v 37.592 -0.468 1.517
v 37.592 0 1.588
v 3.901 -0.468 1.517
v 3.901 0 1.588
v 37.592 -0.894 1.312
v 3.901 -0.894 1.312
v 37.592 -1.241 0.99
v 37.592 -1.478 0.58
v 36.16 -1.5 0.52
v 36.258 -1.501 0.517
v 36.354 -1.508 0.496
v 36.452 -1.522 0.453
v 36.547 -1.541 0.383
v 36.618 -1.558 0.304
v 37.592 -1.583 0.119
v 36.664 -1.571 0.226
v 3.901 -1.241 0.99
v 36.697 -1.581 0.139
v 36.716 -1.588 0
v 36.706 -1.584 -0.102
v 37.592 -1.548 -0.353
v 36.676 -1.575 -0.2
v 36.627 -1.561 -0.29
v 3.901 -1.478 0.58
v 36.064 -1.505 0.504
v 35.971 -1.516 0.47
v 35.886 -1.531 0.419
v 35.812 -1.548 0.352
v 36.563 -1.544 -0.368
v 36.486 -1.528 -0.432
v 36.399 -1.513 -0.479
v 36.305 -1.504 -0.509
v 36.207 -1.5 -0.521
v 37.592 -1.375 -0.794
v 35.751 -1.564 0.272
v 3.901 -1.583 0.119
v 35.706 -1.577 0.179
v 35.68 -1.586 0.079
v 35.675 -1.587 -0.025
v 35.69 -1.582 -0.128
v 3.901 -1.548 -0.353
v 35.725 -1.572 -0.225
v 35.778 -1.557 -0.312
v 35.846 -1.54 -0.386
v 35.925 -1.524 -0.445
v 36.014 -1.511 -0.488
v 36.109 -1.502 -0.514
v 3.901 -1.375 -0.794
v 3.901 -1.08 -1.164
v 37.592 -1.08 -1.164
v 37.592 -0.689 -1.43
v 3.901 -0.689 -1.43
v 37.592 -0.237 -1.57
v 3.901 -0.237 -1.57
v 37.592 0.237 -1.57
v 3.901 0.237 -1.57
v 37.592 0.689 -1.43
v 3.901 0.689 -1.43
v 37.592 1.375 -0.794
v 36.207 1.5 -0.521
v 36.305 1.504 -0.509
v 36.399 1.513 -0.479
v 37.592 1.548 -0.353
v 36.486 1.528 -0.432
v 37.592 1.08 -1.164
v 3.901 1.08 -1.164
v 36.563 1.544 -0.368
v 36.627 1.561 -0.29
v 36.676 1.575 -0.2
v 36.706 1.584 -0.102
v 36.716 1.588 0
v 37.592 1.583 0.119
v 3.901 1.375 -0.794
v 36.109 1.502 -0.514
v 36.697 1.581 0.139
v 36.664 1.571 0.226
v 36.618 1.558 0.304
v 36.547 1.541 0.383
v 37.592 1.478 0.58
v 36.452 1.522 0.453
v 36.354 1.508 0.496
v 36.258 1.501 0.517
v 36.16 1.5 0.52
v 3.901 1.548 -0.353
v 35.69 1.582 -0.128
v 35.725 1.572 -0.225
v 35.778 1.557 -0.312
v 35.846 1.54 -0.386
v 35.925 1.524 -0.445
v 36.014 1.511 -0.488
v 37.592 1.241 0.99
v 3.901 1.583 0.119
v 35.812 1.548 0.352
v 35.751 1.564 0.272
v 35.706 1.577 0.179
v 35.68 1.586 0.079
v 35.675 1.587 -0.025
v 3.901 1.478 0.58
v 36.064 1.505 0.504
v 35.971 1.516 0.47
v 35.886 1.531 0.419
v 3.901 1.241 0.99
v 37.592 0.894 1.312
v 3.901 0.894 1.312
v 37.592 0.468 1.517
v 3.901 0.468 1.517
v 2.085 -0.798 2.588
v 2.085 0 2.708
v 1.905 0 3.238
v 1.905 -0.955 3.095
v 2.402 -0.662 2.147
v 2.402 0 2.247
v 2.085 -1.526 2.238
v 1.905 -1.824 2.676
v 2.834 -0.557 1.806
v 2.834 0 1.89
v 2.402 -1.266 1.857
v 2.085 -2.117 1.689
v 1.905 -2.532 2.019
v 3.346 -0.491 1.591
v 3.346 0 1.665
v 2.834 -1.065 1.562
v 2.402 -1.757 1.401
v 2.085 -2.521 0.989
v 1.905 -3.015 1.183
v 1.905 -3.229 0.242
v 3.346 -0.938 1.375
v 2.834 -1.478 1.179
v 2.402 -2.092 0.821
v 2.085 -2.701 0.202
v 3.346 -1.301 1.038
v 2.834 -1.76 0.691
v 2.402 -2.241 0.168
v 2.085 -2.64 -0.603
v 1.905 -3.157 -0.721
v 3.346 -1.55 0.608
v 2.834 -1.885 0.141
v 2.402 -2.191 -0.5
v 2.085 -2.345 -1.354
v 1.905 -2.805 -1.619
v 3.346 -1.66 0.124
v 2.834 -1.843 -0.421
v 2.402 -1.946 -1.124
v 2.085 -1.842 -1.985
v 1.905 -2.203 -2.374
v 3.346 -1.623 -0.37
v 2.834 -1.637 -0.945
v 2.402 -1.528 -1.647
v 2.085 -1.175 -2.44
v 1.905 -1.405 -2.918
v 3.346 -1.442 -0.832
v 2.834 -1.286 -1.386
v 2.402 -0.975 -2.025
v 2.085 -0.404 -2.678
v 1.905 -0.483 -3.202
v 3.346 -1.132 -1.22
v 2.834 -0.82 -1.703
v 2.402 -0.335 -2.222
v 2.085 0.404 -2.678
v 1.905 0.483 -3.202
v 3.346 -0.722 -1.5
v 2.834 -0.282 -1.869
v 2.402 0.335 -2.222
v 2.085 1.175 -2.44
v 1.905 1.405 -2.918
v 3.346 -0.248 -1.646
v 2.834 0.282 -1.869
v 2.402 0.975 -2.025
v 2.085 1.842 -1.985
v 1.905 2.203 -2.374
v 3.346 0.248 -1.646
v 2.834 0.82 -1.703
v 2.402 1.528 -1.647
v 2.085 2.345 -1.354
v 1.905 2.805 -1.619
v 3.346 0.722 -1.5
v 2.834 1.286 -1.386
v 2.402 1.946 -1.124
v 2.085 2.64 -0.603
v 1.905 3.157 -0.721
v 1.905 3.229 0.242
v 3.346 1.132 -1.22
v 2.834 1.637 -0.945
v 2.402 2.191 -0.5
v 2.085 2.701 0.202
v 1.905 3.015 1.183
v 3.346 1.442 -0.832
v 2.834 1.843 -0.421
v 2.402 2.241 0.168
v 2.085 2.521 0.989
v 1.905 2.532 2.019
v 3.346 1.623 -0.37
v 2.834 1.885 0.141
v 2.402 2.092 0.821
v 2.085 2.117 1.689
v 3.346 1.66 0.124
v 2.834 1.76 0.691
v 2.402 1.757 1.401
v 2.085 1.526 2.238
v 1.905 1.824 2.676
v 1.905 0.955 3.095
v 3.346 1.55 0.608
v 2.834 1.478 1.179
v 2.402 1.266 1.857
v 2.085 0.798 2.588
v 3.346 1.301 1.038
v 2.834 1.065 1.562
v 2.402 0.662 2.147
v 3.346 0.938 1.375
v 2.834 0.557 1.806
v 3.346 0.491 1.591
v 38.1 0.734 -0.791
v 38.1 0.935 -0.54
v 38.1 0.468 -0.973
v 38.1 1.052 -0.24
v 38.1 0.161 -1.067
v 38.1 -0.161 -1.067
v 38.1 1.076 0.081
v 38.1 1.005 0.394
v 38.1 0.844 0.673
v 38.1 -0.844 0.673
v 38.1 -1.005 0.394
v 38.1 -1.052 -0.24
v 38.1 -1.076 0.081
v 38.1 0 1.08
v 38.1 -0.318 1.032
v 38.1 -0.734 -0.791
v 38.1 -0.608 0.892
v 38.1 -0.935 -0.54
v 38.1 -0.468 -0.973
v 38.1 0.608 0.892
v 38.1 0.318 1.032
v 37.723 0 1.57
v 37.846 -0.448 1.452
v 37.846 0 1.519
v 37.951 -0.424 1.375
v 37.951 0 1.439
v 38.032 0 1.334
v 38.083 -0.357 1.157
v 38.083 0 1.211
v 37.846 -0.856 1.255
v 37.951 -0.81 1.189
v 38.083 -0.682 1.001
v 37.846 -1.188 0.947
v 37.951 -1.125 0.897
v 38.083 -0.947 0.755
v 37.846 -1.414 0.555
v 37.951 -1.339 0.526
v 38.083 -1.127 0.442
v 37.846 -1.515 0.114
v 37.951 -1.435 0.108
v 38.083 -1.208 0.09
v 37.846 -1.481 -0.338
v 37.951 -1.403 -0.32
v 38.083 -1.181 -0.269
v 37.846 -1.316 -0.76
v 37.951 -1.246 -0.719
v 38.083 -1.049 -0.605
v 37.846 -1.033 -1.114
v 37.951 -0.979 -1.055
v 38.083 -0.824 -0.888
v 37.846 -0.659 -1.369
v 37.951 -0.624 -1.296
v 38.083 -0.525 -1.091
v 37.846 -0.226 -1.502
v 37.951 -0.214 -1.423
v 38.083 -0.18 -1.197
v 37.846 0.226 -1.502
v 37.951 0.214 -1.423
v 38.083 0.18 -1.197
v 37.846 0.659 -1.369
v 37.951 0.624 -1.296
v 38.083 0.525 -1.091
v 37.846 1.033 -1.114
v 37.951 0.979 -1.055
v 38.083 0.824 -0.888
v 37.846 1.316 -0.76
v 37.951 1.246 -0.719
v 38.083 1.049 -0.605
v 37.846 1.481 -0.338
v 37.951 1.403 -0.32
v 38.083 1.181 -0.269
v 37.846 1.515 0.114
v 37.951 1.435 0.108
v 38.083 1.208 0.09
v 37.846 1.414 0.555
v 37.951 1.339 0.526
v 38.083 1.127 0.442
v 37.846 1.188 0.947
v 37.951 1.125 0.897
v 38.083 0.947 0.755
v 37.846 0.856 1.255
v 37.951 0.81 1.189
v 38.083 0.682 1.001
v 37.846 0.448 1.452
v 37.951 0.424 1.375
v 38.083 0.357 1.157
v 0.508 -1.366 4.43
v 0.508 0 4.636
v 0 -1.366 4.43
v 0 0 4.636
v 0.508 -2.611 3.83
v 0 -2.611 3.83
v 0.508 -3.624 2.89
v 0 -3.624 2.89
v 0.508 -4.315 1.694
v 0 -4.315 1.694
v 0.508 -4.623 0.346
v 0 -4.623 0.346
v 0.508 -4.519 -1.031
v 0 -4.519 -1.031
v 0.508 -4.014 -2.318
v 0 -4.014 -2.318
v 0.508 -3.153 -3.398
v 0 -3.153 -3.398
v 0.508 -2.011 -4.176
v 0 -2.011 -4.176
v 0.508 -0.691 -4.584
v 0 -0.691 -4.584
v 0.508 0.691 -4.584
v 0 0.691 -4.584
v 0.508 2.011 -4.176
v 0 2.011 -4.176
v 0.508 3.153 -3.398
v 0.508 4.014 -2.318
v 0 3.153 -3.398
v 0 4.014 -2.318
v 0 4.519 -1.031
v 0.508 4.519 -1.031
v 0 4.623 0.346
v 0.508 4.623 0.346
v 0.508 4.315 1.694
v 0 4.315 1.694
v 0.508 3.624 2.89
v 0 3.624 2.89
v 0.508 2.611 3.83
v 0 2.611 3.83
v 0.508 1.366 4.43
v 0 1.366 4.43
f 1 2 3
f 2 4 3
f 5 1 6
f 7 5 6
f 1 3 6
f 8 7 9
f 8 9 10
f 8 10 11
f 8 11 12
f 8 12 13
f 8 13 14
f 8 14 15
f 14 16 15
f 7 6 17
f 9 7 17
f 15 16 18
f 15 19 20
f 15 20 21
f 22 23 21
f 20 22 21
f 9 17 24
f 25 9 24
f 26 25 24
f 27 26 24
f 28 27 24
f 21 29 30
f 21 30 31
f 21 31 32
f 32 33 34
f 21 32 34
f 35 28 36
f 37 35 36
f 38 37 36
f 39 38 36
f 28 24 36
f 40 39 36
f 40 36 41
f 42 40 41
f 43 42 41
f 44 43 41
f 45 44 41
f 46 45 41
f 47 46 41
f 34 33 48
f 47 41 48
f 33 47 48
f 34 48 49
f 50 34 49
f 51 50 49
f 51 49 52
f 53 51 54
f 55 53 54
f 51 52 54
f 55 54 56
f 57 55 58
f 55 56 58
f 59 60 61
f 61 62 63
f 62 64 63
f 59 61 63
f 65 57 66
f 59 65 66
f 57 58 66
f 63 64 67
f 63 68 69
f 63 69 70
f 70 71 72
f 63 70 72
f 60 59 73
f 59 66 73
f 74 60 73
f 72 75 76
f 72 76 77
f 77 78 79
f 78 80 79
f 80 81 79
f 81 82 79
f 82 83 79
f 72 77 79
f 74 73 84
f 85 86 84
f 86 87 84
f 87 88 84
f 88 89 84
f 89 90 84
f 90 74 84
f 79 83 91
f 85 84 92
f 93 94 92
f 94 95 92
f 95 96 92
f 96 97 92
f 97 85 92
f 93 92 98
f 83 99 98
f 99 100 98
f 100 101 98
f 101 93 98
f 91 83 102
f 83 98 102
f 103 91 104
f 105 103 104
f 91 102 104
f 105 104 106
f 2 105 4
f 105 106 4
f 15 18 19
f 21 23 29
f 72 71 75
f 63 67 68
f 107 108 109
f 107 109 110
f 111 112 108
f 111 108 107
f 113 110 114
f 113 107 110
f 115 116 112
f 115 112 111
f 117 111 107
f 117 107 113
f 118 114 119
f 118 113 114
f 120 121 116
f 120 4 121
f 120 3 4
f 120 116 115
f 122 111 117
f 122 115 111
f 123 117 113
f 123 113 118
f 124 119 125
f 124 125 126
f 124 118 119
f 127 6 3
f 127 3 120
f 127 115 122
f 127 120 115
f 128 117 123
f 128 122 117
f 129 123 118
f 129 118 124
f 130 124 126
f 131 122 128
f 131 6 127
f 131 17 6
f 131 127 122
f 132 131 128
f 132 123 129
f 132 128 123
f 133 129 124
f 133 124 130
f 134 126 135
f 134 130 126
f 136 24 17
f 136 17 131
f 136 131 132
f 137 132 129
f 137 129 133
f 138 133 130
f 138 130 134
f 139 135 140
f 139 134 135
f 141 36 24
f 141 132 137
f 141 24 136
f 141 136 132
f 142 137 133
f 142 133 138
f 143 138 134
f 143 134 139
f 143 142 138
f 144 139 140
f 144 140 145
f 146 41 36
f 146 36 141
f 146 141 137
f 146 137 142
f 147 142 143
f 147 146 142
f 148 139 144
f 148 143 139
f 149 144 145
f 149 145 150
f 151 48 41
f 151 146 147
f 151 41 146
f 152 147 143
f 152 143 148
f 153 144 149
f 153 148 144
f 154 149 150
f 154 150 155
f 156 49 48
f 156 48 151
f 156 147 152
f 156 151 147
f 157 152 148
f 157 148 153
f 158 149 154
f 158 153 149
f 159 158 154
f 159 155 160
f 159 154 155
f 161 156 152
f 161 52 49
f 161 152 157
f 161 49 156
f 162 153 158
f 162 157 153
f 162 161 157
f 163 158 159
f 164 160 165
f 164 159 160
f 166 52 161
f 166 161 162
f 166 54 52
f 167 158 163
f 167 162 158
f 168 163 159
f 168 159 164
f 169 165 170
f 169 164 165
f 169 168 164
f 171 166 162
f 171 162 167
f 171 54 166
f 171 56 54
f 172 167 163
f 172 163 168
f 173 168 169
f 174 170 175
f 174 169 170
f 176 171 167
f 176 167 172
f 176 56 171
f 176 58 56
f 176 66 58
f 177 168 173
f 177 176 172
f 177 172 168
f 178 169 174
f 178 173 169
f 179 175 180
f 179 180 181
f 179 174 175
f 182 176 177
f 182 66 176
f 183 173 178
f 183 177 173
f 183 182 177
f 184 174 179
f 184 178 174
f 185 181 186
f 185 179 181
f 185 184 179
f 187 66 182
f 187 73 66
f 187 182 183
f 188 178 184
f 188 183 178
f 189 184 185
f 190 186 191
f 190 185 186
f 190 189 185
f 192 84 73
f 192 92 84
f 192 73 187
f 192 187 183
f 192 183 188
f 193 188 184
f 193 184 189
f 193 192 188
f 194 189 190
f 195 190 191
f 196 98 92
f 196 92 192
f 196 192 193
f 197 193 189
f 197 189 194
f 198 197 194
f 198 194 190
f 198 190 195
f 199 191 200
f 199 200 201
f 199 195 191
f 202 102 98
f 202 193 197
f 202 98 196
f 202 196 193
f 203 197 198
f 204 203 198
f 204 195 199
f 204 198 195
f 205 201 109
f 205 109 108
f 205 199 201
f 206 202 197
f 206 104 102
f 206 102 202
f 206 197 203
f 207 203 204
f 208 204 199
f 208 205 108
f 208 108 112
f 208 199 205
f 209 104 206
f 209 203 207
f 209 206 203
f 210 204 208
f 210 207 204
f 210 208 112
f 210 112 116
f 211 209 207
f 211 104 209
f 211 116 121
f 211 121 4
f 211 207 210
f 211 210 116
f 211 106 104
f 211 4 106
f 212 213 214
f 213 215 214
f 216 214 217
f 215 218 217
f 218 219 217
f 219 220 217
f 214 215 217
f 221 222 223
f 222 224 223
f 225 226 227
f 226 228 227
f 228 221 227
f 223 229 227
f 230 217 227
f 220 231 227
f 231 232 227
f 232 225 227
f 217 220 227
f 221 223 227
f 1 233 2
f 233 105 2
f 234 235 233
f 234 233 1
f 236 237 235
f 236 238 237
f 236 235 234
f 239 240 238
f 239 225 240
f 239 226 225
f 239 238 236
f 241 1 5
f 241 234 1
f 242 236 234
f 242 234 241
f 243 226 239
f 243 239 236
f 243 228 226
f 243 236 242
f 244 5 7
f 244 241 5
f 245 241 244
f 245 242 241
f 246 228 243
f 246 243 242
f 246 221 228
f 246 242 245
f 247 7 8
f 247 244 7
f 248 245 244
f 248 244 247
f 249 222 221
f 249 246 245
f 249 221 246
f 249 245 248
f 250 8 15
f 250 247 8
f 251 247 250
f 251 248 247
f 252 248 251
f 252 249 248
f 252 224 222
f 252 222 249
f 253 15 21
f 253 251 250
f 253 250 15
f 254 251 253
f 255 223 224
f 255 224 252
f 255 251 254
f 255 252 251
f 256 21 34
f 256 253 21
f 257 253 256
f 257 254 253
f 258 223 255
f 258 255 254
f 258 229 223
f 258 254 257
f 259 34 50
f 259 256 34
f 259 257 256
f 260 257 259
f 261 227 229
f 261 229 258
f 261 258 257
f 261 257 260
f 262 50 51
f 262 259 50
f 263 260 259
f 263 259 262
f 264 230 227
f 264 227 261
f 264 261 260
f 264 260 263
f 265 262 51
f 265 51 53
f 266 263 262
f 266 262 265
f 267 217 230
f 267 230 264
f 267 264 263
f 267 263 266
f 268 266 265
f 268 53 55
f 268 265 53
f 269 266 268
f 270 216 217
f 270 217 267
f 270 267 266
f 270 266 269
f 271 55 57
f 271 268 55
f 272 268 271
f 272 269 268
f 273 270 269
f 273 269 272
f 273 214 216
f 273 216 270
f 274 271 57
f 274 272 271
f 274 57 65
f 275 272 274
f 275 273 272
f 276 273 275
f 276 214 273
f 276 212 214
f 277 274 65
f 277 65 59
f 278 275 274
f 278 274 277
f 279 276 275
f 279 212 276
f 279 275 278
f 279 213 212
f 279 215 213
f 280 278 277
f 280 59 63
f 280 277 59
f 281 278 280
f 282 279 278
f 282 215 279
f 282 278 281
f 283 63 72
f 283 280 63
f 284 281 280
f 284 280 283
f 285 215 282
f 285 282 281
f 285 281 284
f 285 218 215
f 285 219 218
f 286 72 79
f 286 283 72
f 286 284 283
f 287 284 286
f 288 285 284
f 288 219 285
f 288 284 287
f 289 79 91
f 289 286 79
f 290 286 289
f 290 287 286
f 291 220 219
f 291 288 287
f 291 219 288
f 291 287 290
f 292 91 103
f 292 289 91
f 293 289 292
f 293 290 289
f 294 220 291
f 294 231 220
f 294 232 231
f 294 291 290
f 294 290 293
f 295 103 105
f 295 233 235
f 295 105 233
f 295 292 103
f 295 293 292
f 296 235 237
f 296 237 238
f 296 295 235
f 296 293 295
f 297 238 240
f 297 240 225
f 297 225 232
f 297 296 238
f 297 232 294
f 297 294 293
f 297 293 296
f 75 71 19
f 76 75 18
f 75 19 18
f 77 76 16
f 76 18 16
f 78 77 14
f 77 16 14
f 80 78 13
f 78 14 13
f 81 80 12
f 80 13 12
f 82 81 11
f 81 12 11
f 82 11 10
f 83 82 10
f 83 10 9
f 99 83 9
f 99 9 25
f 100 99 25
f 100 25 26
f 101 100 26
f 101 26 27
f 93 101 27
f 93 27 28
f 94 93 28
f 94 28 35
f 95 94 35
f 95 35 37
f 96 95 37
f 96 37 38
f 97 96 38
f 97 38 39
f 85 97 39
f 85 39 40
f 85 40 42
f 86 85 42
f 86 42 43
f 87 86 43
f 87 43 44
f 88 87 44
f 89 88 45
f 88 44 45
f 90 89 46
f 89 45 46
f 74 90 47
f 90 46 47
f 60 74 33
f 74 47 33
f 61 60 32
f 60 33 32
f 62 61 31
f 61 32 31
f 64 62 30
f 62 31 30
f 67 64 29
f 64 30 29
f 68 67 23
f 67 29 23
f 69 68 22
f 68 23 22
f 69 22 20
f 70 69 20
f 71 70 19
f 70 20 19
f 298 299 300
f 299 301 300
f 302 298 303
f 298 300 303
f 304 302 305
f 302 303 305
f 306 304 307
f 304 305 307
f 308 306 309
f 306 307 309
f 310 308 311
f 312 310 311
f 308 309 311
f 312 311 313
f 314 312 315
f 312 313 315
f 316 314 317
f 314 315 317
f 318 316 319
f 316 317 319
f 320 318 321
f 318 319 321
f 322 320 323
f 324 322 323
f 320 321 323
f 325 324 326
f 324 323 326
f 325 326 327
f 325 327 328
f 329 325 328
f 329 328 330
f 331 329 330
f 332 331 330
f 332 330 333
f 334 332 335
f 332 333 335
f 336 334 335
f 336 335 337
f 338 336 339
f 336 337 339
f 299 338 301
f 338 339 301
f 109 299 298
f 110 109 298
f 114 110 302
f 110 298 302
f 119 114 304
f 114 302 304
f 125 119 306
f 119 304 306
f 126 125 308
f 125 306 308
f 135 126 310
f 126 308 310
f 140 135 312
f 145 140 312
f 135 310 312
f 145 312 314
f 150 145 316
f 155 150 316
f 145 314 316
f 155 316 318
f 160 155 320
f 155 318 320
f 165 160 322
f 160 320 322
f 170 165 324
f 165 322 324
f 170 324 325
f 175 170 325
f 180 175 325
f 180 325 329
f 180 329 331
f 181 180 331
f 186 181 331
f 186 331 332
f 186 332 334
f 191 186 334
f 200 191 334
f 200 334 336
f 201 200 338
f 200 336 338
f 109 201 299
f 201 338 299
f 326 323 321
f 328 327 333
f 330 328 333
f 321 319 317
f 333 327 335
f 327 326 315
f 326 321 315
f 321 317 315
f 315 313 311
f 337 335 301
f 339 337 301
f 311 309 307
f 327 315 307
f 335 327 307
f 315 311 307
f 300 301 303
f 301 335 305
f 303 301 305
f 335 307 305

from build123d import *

# Parameters (mm, degrees)
F3_R     = 0.508
F6_R     = 0.5207
F7_DEPTH = 9.7165


# Not quite as in the source:
# - a fillet or chamfer that OpenCascade refuses, or shapes differently, is made with other operations: its cross-section is extruded or revolved along the edge and cut away or added


with BuildPart() as f1:
    # F0 (on Front) → F1 (revolve)
    with BuildSketch(Plane.XZ):
        Polygon((0, 4.6355), (0, 0), (38.1, 0), (38.1, 1.5875), (1.905, 1.5875), (1.905, 3.2385), (0.508, 4.6355), align=None)
    revolve(axis=Axis((19.05, 0, 0), (1, 0, 0)))

    # F2: fillet of radius 2.032 on 1 edges, made by hand

    # F2_s1 → F2_t2 (revolve)
    with BuildSketch(Plane.XZ):
        with BuildLine():
            ThreePointArc((1.905, 3.2385), (2.6058107165, 2.0537388432), (3.900961673, 1.5875))
            Line((3.900961673, 1.5875), (3.900961673, 1.54686))
            Line((3.900961673, 1.54686), (1.905, 1.54686))
            Line((1.905, 1.54686), (1.86436, 1.5875))
            ThreePointArc((1.86436, 1.5875), (1.86436, 2.413), (1.8650807665, 3.23088))
            Line((1.8650807665, 3.23088), (1.905, 3.2385))
        make_face()
    revolve(axis=Axis((1.905, 0, 0), (1, 0, 0)))

    # F3
    f3_edges = [f1.edges().sort_by_distance(p)[0] for p in [
        (38.1, 0, -1.5875),
    ]]
    fillet(f3_edges, radius=F3_R)

    # F6 (on offset) → F7 (cut, through all)
    with BuildSketch(Plane.XZ.offset(5.08)):
        with Locations((36.195, 0)):
            Circle(F6_R)
    extrude(amount=-F7_DEPTH, mode=Mode.SUBTRACT)


solid = f1.part
